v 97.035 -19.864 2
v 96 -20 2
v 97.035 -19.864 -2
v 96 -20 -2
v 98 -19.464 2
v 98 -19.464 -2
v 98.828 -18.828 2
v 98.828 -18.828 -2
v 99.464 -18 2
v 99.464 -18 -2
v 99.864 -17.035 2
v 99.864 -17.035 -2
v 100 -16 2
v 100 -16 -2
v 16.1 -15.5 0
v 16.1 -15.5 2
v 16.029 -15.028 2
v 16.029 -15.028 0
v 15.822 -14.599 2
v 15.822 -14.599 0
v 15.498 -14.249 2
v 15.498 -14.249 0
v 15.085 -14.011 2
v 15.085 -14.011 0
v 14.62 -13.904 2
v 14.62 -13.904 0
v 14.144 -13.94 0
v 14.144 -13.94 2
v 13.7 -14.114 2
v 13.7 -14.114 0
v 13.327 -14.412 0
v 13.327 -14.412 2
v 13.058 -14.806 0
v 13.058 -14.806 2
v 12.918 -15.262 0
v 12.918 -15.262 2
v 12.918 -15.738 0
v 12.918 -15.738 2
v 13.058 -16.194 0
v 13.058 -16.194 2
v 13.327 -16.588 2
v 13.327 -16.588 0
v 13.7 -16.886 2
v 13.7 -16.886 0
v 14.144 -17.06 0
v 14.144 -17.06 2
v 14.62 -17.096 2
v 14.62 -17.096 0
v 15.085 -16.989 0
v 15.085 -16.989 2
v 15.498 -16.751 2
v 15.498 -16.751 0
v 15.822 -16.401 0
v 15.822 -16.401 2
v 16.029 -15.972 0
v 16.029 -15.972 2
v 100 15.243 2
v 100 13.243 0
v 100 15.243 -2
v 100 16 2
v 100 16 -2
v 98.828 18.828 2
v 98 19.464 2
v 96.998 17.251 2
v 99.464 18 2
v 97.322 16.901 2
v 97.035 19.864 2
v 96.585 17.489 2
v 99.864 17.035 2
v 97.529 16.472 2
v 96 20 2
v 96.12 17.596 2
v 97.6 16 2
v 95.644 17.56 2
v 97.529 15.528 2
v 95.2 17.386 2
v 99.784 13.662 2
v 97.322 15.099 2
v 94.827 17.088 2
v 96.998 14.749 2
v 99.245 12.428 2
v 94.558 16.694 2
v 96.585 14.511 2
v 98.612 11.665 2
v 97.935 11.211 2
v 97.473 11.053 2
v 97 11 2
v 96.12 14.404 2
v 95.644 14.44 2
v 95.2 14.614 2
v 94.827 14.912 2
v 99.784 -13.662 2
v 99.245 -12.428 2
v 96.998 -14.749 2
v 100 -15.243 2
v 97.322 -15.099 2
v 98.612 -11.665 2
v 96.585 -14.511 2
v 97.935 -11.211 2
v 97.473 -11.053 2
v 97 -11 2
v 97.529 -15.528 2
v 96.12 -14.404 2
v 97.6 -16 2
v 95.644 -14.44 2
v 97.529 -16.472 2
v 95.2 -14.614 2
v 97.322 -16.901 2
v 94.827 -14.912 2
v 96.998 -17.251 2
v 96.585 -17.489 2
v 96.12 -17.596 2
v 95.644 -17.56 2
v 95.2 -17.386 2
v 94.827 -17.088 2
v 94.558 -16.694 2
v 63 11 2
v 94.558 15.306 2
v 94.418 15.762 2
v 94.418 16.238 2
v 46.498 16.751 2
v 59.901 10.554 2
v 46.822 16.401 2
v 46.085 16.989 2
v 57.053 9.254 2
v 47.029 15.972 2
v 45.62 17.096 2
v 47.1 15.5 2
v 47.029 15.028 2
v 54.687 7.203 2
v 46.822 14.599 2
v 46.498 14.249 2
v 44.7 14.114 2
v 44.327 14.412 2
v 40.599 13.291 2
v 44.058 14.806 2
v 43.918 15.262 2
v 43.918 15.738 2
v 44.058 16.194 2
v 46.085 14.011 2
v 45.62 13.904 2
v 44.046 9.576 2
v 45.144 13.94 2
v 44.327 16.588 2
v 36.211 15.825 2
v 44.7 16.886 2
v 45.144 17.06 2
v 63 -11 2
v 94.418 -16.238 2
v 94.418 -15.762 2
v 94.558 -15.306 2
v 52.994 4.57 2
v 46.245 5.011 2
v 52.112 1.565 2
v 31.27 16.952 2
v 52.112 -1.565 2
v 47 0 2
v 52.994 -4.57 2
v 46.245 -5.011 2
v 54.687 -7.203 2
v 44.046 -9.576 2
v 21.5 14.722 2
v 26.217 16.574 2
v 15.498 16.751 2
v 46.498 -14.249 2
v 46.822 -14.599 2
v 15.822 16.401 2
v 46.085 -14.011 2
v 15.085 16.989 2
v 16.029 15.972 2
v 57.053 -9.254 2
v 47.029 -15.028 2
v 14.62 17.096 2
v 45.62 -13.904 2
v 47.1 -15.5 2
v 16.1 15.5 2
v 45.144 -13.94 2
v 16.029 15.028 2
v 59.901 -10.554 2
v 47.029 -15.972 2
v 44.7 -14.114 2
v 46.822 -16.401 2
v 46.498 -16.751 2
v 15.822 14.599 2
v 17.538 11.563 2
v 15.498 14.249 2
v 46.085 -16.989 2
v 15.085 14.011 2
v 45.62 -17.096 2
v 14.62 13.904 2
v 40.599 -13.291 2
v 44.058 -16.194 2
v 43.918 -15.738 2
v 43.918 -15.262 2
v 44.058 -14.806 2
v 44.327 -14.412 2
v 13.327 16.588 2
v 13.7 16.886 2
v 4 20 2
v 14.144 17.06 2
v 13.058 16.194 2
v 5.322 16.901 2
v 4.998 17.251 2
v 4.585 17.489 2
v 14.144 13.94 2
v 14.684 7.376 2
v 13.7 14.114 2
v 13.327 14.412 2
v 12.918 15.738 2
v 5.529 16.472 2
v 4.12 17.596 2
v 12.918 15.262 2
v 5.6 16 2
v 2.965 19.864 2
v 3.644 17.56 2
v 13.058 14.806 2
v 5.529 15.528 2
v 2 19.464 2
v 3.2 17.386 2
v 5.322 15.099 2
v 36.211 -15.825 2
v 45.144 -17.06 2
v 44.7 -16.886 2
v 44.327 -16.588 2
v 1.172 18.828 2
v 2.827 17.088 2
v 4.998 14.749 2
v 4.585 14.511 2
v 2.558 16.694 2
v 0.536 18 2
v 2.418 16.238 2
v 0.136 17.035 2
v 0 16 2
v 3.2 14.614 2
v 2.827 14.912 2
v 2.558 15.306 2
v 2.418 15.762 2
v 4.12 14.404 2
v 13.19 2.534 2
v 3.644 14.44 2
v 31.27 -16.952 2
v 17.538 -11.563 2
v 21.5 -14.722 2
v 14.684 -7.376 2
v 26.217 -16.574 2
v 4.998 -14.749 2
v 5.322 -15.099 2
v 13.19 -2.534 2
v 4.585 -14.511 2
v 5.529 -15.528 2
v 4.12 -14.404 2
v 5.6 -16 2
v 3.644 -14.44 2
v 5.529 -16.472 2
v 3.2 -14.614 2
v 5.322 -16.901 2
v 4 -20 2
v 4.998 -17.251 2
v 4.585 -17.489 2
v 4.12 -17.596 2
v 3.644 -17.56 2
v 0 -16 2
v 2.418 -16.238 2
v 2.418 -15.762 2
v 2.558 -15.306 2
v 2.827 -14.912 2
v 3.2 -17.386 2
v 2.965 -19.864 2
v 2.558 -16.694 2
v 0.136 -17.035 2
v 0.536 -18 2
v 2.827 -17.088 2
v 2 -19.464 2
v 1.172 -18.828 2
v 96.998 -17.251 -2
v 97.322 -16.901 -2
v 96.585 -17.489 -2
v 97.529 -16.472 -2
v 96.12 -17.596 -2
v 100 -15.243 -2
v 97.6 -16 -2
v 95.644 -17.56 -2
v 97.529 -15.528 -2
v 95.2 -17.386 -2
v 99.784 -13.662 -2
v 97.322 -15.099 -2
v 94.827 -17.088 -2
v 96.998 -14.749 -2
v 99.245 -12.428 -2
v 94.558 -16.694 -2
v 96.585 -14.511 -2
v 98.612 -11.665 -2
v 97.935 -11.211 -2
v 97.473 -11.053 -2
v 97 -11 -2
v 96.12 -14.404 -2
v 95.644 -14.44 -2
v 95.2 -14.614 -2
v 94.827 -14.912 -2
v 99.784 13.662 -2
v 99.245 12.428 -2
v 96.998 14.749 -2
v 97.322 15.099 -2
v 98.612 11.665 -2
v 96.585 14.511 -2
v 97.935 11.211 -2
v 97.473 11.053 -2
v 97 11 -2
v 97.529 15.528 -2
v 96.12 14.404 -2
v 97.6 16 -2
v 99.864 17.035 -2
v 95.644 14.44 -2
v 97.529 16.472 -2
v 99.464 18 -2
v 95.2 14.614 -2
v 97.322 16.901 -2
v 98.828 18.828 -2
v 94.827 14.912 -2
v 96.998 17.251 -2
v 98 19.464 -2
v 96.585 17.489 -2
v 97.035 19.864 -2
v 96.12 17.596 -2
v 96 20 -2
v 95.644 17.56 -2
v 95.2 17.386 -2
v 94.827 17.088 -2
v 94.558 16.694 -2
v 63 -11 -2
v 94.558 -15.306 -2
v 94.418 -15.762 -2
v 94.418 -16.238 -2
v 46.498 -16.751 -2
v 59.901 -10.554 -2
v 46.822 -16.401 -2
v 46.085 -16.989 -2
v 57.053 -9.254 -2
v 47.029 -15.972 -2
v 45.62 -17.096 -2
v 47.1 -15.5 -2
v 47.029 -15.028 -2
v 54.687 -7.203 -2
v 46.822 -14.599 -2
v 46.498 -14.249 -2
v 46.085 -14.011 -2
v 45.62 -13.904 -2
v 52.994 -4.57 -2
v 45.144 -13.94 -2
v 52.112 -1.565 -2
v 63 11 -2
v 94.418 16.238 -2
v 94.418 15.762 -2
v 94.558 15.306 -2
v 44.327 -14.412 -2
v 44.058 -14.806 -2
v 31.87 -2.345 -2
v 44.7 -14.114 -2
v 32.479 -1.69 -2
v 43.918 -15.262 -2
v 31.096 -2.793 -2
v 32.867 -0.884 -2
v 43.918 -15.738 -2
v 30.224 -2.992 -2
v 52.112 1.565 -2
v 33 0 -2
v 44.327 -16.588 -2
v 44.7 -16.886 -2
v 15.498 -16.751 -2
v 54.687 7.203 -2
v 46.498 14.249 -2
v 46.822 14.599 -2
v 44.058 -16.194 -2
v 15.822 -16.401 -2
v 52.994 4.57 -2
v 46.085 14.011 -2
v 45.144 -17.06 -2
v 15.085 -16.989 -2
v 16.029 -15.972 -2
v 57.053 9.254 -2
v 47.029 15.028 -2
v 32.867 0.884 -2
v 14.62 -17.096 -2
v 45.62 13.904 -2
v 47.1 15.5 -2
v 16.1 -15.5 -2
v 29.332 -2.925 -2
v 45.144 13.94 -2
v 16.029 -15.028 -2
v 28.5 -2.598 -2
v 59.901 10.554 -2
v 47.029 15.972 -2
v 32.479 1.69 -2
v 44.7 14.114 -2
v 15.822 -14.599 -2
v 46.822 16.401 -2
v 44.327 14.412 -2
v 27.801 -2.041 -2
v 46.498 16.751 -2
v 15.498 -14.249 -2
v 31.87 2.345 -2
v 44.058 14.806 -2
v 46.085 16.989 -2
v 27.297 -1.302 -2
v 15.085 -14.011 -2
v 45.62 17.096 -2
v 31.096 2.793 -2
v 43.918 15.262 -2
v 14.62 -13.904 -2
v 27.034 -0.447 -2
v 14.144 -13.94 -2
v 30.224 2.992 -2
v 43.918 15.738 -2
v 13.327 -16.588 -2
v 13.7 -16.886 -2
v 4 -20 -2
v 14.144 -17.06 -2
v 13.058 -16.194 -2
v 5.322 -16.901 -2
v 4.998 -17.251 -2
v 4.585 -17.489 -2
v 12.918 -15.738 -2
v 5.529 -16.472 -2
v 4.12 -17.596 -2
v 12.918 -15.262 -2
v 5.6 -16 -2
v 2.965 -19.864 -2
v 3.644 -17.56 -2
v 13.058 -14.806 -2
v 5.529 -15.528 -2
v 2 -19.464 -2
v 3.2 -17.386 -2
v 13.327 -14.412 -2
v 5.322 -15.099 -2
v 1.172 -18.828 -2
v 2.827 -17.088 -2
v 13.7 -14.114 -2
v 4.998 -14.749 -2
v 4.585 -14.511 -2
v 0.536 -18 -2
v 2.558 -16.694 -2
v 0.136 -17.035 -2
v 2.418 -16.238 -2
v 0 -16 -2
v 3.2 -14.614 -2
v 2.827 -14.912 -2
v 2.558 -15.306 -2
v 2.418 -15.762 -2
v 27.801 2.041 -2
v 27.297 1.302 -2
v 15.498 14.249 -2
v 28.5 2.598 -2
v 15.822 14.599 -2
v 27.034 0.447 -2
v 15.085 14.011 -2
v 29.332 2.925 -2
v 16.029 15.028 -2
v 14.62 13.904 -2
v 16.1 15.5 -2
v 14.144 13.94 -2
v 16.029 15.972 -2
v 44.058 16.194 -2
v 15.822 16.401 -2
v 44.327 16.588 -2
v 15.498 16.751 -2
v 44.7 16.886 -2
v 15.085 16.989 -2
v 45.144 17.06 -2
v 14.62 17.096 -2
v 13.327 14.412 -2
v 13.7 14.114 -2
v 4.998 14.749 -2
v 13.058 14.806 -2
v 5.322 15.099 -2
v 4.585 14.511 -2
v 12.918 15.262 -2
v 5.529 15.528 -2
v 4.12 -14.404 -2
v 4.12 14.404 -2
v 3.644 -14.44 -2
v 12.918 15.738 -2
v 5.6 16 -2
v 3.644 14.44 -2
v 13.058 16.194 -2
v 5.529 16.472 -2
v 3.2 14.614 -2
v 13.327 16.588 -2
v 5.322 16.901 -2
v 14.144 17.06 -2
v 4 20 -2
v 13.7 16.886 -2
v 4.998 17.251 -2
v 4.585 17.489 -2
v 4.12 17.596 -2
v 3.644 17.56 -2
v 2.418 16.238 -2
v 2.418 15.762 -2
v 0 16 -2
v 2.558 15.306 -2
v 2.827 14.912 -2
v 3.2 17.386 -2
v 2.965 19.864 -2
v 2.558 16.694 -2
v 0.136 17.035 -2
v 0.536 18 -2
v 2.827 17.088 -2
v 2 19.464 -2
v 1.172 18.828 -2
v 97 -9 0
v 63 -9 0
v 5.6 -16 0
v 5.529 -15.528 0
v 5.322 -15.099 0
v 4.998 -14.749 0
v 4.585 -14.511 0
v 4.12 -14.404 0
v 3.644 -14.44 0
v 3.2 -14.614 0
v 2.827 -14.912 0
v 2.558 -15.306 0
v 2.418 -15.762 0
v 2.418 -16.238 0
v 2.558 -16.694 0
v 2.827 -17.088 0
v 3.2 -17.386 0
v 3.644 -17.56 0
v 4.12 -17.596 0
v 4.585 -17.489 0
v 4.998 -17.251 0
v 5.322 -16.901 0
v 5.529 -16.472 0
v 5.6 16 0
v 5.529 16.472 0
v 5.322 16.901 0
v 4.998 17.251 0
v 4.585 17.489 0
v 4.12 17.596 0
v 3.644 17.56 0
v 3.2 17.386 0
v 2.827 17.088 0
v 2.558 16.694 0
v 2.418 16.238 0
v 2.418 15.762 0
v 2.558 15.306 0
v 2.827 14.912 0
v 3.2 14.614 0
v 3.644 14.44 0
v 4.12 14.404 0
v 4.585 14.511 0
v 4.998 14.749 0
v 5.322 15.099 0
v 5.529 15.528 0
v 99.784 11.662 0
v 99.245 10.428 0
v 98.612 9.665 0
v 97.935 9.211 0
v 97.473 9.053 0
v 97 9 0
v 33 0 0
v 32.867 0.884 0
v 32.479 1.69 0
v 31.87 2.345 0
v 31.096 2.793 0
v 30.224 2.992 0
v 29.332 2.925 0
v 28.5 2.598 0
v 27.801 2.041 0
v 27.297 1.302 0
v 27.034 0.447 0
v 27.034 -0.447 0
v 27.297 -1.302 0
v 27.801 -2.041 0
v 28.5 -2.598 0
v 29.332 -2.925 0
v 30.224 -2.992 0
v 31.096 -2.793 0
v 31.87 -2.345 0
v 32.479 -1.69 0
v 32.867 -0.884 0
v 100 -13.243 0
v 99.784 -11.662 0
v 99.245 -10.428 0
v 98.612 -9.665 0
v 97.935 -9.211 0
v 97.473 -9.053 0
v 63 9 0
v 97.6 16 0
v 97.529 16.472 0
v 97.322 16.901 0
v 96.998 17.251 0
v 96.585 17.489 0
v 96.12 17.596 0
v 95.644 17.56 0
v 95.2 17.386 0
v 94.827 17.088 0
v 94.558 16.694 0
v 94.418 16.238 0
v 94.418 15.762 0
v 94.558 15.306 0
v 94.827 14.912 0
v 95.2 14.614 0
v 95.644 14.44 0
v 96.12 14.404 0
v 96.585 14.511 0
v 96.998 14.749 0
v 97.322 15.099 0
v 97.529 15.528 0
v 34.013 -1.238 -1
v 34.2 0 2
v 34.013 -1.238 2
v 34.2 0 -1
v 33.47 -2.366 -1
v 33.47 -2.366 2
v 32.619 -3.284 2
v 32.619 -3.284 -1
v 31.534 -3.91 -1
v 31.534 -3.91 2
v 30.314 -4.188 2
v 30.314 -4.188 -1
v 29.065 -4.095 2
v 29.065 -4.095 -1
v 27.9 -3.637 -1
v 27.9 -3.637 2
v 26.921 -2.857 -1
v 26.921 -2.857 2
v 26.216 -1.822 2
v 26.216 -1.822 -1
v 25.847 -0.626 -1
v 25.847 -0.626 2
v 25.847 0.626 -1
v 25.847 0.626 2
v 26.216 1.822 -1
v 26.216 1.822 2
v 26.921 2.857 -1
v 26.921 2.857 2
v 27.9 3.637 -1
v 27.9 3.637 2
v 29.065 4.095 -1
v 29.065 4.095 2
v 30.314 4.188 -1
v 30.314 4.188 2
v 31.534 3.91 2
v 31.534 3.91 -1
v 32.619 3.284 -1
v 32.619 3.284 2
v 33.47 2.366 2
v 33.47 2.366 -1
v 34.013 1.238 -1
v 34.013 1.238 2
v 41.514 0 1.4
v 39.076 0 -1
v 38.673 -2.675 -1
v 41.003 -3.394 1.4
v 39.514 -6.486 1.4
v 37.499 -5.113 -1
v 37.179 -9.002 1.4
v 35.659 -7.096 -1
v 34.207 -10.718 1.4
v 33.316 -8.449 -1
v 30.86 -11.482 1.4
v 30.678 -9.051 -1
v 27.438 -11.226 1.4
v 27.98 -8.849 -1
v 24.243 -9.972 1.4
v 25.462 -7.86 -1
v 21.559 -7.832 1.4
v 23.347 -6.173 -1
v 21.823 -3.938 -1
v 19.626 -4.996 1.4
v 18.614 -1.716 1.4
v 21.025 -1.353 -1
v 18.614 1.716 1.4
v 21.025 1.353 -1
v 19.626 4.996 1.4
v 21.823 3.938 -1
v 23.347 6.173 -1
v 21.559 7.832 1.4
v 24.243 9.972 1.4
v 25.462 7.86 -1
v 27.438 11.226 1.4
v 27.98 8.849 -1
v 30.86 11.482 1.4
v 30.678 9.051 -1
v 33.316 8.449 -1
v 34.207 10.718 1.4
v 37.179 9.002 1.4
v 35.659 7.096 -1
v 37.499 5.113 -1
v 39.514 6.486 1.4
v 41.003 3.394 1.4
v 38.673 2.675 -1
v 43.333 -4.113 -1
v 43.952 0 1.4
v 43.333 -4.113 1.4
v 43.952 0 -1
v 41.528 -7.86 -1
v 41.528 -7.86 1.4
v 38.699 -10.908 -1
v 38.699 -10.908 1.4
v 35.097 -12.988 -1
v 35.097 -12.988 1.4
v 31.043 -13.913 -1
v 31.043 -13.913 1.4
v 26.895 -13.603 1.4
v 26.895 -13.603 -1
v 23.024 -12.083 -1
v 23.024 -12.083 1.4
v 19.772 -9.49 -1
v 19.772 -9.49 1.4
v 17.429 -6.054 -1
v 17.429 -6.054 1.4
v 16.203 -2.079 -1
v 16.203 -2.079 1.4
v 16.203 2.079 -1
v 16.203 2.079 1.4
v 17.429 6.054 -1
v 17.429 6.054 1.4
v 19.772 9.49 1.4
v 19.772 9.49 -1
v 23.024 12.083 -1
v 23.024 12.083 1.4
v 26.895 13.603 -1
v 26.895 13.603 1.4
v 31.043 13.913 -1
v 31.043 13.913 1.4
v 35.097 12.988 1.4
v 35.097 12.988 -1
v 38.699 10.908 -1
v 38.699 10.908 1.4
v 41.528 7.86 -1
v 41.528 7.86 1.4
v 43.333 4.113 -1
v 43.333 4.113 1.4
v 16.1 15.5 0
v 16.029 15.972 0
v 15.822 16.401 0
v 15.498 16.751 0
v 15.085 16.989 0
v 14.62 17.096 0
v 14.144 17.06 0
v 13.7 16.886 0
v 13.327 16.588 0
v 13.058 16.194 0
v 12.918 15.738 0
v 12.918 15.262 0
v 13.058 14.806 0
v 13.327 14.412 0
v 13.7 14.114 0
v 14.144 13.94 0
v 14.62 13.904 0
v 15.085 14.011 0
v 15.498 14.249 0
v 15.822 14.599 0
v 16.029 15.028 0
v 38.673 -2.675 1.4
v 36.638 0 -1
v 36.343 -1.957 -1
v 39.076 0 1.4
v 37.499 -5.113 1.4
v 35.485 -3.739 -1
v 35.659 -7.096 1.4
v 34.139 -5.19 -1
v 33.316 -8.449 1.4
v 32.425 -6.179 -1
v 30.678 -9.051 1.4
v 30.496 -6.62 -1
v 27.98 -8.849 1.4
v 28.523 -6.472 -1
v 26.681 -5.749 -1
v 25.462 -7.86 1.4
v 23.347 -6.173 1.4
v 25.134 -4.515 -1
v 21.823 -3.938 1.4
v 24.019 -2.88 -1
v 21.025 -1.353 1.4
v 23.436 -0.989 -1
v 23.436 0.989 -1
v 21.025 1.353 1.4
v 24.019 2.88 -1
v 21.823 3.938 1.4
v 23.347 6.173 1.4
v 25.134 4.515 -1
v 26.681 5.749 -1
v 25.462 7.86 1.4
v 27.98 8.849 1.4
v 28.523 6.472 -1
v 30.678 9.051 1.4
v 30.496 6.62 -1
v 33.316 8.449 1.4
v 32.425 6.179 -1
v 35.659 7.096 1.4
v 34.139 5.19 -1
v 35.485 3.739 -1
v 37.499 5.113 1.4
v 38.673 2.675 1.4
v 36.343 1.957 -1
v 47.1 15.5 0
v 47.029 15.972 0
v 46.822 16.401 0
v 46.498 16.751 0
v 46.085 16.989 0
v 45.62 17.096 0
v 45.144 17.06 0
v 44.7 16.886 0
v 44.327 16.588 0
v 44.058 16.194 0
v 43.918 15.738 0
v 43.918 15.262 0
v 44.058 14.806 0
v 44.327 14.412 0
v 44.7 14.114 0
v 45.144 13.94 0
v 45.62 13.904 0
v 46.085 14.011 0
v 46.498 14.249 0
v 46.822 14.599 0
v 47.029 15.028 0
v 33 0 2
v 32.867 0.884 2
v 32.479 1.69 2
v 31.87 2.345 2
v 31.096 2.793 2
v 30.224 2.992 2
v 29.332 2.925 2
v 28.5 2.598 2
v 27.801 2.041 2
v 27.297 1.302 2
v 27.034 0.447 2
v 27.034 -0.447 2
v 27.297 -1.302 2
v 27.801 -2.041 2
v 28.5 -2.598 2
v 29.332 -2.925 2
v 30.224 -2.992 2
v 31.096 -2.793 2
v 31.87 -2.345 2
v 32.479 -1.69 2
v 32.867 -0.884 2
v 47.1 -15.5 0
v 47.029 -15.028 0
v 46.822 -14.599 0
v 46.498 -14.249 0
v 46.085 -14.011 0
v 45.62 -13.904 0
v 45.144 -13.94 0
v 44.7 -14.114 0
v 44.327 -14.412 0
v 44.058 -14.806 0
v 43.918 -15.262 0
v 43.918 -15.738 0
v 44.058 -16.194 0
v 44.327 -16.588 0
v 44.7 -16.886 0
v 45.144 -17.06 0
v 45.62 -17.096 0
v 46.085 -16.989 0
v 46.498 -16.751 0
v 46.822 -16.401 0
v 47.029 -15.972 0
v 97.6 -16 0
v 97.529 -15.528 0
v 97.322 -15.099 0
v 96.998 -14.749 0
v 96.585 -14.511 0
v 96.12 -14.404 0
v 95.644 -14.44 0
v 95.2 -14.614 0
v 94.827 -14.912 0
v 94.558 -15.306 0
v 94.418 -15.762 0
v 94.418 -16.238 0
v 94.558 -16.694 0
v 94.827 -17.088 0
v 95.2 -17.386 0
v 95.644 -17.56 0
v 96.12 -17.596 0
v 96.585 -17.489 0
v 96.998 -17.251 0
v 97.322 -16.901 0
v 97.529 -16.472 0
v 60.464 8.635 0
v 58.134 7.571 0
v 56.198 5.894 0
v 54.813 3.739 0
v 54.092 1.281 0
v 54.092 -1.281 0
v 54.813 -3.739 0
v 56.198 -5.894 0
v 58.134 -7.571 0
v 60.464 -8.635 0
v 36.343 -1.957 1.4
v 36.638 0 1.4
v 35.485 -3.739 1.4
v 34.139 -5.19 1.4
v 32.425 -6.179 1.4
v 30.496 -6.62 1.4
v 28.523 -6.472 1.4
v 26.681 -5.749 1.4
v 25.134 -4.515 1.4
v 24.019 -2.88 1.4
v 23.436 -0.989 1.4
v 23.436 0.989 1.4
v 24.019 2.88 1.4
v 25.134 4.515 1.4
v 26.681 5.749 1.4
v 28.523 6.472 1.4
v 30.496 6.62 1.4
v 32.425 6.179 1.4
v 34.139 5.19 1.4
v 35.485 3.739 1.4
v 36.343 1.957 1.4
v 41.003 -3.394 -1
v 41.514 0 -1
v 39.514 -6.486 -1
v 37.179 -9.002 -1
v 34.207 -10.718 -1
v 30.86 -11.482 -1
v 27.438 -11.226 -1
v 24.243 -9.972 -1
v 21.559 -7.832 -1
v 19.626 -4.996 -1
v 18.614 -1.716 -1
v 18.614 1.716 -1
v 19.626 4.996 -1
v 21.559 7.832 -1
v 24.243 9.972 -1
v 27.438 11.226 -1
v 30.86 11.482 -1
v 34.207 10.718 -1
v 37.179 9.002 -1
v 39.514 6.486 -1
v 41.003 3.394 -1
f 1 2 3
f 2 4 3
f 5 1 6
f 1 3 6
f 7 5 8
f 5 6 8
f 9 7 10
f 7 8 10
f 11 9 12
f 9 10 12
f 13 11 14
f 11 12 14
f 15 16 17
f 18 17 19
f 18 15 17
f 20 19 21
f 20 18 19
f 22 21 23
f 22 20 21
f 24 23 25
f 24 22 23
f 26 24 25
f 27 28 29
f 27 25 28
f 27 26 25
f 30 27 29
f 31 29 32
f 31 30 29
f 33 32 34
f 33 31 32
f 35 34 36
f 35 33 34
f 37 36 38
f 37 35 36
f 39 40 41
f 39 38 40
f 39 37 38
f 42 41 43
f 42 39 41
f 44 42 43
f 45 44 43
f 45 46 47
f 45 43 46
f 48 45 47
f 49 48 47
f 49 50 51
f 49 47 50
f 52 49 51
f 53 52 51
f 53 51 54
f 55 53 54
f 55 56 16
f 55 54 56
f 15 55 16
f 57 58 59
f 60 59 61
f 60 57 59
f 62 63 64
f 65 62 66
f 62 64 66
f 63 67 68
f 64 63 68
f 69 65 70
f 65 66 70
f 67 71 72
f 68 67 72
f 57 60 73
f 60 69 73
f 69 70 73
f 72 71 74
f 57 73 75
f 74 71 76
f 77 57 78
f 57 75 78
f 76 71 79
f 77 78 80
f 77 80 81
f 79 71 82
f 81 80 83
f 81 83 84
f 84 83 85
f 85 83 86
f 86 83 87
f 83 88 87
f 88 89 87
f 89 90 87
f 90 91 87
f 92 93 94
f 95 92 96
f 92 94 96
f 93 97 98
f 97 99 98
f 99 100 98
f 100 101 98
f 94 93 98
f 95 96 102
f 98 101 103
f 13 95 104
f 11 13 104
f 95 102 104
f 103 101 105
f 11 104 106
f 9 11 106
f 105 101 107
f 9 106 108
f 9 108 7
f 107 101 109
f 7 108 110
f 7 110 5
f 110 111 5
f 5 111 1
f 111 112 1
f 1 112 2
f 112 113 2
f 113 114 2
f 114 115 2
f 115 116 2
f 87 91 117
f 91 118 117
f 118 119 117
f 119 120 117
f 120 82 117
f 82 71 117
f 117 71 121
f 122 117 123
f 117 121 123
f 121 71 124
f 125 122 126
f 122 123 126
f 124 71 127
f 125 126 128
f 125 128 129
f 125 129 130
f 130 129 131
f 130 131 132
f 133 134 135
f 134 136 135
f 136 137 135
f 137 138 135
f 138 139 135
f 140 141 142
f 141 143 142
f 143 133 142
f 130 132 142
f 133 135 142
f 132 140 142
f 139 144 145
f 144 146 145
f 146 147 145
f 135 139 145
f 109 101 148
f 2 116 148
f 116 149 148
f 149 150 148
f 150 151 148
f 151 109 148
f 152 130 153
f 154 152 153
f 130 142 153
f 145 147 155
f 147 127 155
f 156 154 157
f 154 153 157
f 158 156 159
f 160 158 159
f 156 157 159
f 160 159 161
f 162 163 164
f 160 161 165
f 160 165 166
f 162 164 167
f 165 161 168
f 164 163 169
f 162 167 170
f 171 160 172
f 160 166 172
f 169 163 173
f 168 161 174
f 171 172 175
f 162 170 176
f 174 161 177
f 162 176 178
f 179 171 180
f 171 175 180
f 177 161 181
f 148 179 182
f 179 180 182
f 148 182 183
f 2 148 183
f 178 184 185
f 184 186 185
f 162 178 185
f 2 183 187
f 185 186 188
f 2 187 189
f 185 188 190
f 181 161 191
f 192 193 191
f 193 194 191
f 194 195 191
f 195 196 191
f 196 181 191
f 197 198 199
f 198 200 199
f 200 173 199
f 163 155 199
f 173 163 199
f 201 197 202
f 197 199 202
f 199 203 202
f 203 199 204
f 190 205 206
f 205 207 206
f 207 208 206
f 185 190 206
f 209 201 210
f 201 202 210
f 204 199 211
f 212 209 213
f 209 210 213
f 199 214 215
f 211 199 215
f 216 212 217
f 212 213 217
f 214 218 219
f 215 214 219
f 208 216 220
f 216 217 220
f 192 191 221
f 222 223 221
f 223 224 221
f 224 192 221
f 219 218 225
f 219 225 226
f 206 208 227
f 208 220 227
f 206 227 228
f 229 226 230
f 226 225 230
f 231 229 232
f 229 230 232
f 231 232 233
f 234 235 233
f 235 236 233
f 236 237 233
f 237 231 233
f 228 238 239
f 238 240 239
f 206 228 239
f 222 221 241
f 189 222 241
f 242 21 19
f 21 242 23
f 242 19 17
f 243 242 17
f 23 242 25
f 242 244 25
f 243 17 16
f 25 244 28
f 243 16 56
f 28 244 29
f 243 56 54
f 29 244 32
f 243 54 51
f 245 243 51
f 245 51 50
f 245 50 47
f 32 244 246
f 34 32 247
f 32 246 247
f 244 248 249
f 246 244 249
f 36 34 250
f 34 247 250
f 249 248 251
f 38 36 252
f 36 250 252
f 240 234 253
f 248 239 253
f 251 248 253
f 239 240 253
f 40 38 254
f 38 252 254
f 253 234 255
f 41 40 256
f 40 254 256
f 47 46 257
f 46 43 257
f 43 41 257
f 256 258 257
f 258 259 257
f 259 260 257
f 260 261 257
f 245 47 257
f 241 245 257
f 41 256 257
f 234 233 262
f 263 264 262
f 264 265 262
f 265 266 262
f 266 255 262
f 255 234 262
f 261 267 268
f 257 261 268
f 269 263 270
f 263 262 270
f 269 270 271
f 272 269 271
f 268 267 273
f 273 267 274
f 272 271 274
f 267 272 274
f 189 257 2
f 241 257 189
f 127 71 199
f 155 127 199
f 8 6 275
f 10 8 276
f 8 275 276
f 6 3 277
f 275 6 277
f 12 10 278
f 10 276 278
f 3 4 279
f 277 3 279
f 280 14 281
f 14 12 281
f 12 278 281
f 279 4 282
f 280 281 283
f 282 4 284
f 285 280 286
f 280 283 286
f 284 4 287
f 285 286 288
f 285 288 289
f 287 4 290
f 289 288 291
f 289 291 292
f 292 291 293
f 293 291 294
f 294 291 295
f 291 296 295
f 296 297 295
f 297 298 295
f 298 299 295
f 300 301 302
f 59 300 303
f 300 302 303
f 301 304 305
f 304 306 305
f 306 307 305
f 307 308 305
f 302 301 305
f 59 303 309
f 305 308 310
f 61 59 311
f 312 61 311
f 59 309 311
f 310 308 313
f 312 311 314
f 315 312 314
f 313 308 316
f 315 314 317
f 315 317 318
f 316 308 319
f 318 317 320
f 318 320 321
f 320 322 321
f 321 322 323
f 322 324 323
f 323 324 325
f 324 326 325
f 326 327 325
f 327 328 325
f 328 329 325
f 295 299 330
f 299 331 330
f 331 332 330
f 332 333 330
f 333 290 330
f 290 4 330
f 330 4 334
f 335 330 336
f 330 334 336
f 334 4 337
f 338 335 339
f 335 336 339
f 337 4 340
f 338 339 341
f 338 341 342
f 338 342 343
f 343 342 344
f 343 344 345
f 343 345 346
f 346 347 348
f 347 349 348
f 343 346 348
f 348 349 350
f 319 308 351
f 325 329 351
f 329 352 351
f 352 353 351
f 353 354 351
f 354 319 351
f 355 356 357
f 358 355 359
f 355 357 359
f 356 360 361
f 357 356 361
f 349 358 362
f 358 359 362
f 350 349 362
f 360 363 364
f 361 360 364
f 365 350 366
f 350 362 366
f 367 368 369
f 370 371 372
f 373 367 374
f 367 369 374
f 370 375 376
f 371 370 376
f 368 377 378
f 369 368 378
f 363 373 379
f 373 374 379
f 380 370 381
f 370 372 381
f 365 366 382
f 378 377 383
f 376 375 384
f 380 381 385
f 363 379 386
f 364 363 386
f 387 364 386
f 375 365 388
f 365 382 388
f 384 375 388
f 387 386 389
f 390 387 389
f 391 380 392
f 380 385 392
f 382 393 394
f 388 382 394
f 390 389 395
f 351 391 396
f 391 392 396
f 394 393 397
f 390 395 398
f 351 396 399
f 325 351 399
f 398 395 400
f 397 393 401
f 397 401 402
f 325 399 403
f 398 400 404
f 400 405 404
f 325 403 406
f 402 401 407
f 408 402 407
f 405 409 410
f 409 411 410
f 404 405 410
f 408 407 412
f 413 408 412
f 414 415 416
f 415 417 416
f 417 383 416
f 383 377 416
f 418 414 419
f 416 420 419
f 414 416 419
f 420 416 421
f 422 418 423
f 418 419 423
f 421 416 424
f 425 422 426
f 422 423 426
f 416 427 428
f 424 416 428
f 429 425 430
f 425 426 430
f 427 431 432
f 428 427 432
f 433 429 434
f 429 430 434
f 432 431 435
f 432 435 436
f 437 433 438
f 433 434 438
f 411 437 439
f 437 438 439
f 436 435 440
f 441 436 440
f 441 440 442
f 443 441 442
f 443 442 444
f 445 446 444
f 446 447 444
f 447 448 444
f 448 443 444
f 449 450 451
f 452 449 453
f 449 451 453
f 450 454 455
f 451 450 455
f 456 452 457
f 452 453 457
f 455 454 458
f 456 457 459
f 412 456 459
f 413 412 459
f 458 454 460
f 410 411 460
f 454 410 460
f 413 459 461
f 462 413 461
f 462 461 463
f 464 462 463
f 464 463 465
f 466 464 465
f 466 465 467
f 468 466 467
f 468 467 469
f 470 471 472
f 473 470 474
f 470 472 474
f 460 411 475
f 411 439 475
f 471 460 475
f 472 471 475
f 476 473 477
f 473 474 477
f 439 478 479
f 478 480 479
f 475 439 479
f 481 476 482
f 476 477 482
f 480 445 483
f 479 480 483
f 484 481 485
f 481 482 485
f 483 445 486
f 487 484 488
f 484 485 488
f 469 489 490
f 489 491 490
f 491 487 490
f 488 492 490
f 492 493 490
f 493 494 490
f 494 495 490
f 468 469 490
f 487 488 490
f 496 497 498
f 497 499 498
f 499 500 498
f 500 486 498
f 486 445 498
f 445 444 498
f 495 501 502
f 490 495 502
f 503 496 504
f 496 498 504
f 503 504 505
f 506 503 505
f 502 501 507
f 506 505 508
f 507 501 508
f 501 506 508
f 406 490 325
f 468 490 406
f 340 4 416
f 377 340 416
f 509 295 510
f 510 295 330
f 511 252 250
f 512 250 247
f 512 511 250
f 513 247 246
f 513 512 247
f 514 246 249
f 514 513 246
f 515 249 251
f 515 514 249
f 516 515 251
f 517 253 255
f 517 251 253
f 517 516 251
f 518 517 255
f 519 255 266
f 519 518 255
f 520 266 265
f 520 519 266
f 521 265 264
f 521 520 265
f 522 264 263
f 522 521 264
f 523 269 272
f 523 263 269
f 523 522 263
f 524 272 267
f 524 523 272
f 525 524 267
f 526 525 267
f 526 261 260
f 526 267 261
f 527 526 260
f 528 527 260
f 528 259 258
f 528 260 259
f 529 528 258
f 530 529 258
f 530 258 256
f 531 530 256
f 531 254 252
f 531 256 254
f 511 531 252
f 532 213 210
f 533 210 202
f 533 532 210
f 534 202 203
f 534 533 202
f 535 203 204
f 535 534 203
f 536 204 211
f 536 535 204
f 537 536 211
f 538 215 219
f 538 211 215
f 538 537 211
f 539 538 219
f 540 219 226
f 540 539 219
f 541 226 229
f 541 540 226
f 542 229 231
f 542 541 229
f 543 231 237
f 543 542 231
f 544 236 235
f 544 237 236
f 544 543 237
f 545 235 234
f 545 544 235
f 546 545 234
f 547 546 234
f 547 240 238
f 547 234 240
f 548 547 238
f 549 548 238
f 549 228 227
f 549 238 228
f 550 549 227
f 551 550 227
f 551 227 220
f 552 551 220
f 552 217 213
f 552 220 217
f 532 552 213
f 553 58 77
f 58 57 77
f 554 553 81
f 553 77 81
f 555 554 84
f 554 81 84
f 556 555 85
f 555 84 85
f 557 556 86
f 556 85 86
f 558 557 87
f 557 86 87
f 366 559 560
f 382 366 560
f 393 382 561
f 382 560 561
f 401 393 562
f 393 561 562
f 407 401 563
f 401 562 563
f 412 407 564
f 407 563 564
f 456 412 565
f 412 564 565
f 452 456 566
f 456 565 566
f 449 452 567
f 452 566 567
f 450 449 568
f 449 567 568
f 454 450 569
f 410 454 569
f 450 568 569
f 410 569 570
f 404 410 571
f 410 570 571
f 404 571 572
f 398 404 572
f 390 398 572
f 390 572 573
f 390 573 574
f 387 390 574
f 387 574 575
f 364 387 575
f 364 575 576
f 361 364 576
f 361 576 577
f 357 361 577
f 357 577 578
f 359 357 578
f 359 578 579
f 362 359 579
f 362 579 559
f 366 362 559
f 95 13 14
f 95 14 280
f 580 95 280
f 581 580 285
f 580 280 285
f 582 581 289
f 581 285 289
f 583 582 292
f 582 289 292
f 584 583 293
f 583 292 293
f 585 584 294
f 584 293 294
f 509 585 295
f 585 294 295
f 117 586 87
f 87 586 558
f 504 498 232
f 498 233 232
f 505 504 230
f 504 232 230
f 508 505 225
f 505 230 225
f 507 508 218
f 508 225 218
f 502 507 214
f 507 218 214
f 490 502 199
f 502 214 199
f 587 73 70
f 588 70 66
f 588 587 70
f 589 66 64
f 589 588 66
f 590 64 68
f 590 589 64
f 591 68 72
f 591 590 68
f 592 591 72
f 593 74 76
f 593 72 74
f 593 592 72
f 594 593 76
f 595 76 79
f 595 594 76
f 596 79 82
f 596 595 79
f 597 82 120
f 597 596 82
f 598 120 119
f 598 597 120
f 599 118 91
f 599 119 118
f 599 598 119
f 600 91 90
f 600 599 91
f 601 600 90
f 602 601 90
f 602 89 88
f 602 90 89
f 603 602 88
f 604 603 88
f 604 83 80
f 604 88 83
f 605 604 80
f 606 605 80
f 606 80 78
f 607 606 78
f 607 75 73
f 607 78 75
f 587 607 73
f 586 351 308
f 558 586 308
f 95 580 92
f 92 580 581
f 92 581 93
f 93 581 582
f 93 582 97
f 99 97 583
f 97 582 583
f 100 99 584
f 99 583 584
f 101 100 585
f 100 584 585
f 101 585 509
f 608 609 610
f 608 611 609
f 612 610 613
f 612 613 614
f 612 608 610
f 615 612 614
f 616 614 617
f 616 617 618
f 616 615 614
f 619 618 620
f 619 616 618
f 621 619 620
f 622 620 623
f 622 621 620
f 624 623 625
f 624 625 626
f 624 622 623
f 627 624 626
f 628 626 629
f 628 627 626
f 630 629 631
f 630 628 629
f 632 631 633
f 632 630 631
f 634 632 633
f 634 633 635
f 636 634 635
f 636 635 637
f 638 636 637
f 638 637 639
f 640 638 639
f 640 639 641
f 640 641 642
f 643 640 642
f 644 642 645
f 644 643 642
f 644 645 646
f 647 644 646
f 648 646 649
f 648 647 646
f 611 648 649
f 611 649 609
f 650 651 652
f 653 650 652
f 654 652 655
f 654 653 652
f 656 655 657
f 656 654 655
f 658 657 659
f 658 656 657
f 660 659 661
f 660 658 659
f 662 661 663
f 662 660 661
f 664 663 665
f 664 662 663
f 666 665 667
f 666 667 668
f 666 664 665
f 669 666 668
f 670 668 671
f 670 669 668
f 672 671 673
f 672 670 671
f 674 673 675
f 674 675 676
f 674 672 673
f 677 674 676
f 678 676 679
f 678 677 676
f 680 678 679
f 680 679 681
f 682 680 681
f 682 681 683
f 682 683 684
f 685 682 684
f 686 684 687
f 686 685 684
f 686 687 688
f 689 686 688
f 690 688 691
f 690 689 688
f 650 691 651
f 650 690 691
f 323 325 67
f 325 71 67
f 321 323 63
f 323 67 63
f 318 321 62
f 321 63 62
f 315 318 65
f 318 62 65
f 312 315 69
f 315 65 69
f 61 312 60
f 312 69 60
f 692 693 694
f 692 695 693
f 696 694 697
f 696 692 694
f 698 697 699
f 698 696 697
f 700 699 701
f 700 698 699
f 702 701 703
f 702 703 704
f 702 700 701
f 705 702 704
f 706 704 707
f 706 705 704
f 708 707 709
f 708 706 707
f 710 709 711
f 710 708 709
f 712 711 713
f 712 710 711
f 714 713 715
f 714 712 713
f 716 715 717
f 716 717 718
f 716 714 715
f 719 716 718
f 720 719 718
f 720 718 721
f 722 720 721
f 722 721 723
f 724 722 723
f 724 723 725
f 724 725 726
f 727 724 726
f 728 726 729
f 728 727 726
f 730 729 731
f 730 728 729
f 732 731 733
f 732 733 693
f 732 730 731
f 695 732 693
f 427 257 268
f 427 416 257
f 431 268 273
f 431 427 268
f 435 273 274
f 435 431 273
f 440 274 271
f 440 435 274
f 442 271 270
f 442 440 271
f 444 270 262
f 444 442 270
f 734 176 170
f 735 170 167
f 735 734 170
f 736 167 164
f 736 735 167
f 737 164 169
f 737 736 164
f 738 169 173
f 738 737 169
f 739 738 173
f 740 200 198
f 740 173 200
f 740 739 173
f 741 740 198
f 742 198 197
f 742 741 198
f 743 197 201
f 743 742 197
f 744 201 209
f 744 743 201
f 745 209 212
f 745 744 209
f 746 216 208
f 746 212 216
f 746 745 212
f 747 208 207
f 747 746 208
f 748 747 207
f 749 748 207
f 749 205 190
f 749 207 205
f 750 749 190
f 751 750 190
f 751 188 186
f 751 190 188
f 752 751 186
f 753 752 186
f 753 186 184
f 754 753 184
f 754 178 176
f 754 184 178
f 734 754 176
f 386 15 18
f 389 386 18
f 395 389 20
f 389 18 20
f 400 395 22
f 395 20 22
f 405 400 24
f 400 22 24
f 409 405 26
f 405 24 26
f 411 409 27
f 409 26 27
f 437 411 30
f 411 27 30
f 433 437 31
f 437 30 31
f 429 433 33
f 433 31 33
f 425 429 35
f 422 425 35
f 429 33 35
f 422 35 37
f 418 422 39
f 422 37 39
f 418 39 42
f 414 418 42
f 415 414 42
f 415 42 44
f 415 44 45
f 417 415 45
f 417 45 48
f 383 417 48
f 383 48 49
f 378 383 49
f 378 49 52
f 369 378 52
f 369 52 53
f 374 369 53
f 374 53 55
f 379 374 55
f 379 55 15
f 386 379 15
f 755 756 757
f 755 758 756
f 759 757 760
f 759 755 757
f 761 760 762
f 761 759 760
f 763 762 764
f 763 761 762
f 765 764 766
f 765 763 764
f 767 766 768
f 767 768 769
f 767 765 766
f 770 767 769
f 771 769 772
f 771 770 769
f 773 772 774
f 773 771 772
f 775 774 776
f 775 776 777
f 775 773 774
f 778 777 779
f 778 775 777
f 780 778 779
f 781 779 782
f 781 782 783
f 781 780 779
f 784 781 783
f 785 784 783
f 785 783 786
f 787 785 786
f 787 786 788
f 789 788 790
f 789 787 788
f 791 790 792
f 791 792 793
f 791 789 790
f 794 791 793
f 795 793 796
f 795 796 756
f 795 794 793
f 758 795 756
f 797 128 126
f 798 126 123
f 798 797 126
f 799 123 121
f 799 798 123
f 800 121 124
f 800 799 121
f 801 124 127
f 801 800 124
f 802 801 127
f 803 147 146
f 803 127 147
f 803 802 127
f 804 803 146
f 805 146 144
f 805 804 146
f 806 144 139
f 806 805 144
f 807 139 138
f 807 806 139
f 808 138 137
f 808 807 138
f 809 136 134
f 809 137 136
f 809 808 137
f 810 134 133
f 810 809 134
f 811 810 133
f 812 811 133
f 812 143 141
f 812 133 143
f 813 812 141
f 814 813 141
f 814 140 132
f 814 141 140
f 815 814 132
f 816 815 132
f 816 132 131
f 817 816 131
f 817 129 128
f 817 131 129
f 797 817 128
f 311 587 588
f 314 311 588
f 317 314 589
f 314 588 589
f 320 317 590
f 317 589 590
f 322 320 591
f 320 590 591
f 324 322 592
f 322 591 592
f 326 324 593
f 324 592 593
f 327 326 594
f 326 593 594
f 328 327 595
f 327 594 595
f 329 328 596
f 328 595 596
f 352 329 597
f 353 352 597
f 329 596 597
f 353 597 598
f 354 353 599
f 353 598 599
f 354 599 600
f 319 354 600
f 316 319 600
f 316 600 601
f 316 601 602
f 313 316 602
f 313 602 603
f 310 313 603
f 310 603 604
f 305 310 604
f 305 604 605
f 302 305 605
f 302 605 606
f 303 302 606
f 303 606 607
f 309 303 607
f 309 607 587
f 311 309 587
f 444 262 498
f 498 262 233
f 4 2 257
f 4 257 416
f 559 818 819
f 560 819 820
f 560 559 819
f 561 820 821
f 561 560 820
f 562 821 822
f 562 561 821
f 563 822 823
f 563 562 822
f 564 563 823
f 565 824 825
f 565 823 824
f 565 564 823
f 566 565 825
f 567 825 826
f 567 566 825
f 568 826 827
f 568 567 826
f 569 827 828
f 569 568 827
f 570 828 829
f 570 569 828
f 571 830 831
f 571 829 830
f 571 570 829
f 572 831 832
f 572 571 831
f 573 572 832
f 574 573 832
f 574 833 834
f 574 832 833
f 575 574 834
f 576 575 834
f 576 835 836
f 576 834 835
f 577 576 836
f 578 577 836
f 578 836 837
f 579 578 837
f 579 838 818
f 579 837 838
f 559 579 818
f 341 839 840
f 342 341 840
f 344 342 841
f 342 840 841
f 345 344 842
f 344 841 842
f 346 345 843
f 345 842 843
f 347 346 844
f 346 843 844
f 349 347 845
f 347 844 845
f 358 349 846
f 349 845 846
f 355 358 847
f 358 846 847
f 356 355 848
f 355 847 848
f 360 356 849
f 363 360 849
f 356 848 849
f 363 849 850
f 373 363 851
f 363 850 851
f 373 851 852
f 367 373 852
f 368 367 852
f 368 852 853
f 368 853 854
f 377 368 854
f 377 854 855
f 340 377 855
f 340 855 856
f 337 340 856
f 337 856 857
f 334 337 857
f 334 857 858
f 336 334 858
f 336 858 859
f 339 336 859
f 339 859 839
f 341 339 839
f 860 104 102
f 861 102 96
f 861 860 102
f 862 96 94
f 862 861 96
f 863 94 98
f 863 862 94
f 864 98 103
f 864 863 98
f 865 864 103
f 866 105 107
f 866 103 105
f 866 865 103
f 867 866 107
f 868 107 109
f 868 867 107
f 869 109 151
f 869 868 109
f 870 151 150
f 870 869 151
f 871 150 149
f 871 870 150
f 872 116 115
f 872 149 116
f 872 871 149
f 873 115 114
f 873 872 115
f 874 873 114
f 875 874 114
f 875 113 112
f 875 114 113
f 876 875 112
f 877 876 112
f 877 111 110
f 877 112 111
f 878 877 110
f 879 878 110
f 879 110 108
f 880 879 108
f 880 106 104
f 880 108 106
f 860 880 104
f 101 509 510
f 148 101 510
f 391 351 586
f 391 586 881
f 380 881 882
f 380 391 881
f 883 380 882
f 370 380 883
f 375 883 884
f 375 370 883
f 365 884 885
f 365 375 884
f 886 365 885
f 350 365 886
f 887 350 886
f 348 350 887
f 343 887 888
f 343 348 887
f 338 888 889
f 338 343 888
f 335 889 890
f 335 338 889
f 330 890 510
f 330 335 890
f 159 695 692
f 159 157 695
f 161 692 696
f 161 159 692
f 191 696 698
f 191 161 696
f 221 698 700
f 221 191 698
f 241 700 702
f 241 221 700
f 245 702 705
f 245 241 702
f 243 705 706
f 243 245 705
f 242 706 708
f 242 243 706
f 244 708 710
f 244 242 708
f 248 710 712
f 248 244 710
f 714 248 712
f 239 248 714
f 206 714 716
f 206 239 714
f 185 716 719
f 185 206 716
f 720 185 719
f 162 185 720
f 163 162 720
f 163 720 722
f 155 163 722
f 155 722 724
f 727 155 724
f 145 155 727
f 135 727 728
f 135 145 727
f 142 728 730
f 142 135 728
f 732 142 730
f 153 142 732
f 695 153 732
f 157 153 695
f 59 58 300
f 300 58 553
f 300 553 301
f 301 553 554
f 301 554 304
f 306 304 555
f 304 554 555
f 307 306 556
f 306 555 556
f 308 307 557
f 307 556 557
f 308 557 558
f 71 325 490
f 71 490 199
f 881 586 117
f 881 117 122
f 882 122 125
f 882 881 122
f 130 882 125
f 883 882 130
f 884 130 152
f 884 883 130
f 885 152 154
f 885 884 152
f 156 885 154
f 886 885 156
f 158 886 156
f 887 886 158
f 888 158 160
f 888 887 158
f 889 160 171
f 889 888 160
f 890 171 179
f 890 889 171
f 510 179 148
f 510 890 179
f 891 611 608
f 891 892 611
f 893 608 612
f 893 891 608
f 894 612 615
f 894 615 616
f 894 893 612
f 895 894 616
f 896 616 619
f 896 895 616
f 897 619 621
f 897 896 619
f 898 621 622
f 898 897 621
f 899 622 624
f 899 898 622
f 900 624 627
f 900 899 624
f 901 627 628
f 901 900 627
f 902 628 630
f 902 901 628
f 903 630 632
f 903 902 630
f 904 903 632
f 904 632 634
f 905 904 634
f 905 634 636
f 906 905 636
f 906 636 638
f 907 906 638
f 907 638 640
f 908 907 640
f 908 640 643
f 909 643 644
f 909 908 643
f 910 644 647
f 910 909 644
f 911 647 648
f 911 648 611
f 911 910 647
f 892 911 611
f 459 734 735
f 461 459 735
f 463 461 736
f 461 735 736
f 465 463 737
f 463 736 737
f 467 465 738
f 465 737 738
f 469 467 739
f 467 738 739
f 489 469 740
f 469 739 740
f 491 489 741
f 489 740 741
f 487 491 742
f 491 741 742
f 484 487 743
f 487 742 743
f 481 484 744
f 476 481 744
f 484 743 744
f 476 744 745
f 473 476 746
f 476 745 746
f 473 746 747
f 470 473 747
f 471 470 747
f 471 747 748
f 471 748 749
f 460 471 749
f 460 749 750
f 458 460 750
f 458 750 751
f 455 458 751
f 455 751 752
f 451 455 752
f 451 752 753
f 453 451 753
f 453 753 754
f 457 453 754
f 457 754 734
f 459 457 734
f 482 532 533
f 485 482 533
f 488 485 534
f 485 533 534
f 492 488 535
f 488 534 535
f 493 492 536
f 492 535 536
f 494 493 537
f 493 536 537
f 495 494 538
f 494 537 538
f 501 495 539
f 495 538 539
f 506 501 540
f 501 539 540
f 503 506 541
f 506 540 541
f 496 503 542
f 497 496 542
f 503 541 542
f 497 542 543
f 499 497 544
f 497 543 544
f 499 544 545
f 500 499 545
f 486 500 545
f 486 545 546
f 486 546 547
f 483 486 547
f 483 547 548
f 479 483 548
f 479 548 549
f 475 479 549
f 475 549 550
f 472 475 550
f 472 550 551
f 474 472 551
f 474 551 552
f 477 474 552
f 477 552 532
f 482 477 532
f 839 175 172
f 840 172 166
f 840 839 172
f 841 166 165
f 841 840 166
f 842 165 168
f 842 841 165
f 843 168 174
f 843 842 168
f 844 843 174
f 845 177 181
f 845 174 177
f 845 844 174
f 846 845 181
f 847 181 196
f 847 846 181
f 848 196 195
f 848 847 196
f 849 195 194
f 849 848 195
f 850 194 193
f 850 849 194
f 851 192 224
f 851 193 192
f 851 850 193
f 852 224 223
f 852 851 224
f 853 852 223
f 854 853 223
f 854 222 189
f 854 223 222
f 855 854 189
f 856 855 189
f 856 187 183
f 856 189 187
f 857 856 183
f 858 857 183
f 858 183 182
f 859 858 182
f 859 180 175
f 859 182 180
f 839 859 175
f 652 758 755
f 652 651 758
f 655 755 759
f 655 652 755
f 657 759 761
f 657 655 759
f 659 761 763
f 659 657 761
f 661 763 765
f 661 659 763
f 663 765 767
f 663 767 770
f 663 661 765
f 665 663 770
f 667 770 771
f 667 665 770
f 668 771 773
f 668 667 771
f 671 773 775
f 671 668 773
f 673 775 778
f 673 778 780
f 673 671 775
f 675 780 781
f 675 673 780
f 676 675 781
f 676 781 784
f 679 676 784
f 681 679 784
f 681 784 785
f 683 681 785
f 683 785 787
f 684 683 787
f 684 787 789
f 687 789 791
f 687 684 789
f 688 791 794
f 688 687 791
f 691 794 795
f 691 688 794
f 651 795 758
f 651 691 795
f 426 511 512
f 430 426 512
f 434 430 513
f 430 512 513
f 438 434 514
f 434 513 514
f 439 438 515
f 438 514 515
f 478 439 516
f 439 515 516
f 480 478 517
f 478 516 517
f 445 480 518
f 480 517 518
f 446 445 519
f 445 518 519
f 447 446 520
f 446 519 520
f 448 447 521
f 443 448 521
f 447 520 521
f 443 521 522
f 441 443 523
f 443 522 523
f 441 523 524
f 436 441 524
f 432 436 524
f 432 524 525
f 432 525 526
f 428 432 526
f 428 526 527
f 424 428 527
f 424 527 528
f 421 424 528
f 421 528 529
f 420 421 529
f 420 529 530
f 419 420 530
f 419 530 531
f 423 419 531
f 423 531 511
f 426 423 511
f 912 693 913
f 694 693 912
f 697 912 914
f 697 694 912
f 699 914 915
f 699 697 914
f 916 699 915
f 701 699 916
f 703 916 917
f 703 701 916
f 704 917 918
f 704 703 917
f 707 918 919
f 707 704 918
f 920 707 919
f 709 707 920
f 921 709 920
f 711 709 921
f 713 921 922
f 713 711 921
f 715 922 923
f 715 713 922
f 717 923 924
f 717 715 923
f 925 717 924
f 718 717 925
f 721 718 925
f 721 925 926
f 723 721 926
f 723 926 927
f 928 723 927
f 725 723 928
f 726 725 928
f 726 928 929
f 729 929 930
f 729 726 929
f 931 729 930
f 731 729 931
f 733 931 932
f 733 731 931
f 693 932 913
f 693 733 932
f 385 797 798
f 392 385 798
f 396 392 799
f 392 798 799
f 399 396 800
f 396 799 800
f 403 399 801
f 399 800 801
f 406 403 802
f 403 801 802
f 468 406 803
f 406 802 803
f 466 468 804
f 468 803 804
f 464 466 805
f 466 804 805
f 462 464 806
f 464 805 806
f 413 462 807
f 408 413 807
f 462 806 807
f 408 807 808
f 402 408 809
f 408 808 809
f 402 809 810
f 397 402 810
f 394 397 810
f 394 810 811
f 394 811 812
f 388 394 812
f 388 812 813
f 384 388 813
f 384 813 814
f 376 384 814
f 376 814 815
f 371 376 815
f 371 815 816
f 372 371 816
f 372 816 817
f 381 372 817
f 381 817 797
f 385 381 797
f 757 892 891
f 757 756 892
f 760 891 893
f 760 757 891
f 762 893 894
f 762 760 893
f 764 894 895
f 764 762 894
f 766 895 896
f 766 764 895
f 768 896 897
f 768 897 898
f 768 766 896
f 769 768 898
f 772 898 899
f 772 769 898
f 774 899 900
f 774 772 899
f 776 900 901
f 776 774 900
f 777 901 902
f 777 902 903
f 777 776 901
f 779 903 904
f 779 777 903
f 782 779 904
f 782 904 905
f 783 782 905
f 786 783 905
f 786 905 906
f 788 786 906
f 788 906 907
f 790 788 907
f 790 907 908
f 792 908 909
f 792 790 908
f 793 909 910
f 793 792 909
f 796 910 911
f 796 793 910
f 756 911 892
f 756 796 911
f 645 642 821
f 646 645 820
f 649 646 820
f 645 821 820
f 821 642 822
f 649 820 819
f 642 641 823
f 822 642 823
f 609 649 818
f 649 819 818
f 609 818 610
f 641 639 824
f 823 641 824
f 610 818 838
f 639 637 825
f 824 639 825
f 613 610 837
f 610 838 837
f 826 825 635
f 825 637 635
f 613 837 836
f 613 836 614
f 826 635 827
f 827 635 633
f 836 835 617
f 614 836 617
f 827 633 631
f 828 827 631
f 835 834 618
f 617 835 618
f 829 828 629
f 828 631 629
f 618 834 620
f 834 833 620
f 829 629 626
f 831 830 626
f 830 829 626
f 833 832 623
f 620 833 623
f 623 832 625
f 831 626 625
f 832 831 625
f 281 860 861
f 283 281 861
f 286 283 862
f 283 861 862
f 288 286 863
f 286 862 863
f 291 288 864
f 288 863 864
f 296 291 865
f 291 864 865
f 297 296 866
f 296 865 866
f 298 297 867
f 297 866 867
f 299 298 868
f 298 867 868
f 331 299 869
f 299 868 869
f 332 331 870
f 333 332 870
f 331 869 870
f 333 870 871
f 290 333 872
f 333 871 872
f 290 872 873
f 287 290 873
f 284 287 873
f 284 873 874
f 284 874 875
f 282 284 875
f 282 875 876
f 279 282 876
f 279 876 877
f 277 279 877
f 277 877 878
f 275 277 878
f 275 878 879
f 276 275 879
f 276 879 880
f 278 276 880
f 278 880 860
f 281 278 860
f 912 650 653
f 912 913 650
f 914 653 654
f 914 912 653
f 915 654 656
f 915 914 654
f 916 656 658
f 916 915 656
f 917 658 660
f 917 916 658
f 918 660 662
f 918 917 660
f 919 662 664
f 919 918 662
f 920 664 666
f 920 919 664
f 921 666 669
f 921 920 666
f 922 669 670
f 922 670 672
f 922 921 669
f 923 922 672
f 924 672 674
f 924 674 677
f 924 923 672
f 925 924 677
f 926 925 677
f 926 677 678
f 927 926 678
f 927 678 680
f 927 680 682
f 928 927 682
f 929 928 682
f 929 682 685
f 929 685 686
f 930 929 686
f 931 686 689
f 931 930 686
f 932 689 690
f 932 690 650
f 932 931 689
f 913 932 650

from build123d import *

# Parameters (mm, degrees)
PAD_DEPTH         = 100
SKETCH001_R       = 1.6
SKETCH001_R_2     = 3
POCKET_DEPTH      = 2.001
POCKET_DEPTH_BACK = 2.001
SKETCH004_R       = 11
SKETCH003_R       = 9
SKETCH005_R       = 11
FILLET_R          = 4
FILLET001_R       = 3


with BuildPart() as part:
    # Sketch → Pad (new body)
    with BuildSketch(Plane.YZ):
        Polygon((0, 2), (-20, 2), (-20, 0), (-20, -2), (0, -2), (20, -2), (20, 0), (20, 2), align=None)
    extrude(amount=PAD_DEPTH)

    # Sketch001 → Pocket (cut, two sides)
    with BuildSketch(Plane.XY) as pocket_sk:
        with Locations((14.5, 15.5)):
            Circle(SKETCH001_R)
        with Locations((45.5, 15.5)):
            Circle(SKETCH001_R)
        with Locations((45.5, -15.5)):
            Circle(SKETCH001_R)
        with Locations((14.5, -15.5)):
            Circle(SKETCH001_R)
        with Locations((30, 0)):
            Circle(SKETCH001_R_2)
        with Locations((4, 16)):
            Circle(SKETCH001_R)
        with Locations((4, -16)):
            Circle(SKETCH001_R)
        with Locations((96, 16)):
            Circle(SKETCH001_R)
        with Locations((96, -16)):
            Circle(SKETCH001_R)
    extrude(amount=-POCKET_DEPTH, mode=Mode.SUBTRACT)
    extrude(pocket_sk.sketch, amount=POCKET_DEPTH_BACK, mode=Mode.SUBTRACT)

    # Sketch004 (on DatumPlane) → SubtractiveLoft section 0
    with BuildSketch(Plane.XY.offset(2)):
        with Locations((63, 0)):
            Circle(SKETCH004_R)
    # Sketch003 → SubtractiveLoft section 1
    with BuildSketch(Plane.XY):
        with Locations((63, 0)):
            Circle(SKETCH003_R)
    # Sketch005 (on DatumPlane) → SubtractiveLoft section 2
    with BuildSketch(Plane.XY.offset(-2)):
        with Locations((63, 0)):
            Circle(SKETCH005_R)
    loft(ruled=True, mode=Mode.SUBTRACT)

    # Sketch007 (on DatumPlane) → SubtractiveLoft001 section 0
    with BuildSketch(Plane.XY.offset(2)):
        Polygon((63, 0), (63, 11), (113, 11), (113, -11), (63, -11), align=None)
    # Sketch006 → SubtractiveLoft001 section 1
    with BuildSketch(Plane.XY):
        Polygon((63, 0), (63, 9), (113, 9), (113, -9), (63, -9), align=None)
    # Sketch008 (on DatumPlane) → SubtractiveLoft001 section 2
    with BuildSketch(Plane.XY.offset(-2)):
        Polygon((63, 11), (63, 0), (63, -11), (113, -11), (113, 11), align=None)
    loft(ruled=True, mode=Mode.SUBTRACT)

    # Sketch009 (on DatumPlane) → Groove (revolve, cut)
    with BuildSketch(Plane(origin=(30, 0, 0), x_dir=(1, 0, 0), z_dir=(0, 1, 0))):
        Polygon((4.2, -2), (4.2, 1), (6.638095, -1.4), (6.638095, 1), (9.07619, -1.4), (9.07619, 1), (11.514286, -1.4), (11.514286, 1), (13.952381, -1.4), (13.952381, 1), (17, -2), align=None)
    revolve(axis=Axis((30, 0, 0), (0, 0, -1)), mode=Mode.SUBTRACT)

    # Fillet
    fillet_edges = [part.edges().sort_by_distance(p)[0] for p in [
        (0, -20, 1),
        (0, 20, 1),
        (100, 20, 1),
        (100, -20, 1),
    ]]
    fillet(fillet_edges, radius=FILLET_R)

    # Fillet001
    fillet001_edges = [part.edges().sort_by_distance(p)[0] for p in [
        (100, -10, 1),
        (100, 10, 1),
        (100, 10, -1),
        (100, -10, -1),
    ]]
    fillet(fillet001_edges, radius=FILLET001_R)


solid = part.part
